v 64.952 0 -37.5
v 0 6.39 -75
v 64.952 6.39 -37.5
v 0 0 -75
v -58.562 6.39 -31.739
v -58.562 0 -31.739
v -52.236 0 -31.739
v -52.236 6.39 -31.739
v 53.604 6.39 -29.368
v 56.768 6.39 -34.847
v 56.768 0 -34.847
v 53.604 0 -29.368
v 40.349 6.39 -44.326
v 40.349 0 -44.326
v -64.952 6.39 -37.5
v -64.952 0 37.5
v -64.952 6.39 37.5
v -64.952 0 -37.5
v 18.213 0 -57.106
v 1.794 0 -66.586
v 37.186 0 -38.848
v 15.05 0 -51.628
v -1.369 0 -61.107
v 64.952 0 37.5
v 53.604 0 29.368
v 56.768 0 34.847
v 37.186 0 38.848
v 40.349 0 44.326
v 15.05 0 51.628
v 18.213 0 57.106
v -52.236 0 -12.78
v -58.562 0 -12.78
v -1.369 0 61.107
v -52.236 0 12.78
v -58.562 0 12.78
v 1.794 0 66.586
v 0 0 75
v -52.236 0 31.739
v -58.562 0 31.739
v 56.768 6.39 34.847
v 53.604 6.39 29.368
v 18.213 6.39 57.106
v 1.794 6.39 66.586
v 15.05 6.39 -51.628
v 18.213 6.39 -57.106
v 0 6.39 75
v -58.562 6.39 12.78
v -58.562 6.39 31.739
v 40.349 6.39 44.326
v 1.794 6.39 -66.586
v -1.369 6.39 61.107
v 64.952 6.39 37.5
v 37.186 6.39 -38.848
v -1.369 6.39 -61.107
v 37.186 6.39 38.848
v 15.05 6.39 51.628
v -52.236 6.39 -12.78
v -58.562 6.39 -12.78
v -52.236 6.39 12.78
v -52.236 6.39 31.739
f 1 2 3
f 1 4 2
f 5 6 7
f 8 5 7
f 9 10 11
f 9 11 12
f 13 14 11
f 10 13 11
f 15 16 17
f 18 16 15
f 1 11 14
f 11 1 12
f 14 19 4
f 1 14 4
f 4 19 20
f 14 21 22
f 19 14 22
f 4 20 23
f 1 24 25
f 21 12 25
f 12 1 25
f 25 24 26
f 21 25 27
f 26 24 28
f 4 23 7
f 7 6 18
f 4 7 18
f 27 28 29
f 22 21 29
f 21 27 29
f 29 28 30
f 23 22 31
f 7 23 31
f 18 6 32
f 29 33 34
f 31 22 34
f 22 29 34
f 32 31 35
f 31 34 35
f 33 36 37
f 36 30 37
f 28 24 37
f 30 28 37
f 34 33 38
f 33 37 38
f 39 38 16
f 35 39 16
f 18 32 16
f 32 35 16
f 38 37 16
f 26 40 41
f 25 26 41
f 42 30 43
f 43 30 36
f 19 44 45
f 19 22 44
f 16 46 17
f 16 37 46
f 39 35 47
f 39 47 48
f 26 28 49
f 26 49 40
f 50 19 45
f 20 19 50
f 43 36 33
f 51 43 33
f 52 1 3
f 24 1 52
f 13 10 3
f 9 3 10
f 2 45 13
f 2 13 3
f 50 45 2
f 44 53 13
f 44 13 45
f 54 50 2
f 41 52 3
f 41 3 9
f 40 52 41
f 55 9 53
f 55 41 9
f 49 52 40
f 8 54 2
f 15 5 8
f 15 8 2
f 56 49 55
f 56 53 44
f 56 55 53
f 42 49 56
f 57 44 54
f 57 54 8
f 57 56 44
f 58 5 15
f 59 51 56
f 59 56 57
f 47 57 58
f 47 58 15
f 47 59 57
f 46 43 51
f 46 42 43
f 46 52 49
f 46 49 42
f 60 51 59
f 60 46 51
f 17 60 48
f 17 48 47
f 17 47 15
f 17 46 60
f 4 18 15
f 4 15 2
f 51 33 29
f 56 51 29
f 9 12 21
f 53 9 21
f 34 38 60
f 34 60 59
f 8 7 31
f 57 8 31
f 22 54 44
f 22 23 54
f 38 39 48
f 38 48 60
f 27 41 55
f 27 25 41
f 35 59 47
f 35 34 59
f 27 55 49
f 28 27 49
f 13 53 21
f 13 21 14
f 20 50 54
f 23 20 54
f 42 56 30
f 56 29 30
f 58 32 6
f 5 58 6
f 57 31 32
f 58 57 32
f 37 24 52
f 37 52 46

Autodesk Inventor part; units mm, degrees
ref_plane "YZ Plane" through (0, 0, 0) normal (1, 0, 0) x (0, 1, 0)
ref_plane "XZ Plane" through (0, 0, 0) normal (0, 1, 0) x (-1, 0, 0)
ref_plane "XY Plane" through (0, 0, 0) normal (0, 0, 1) x (1, 0, 0)
sketch "Sketch1" plane through (0, 0, 0) normal (0, 1, 0) x (-1, 0, 0)
  circle A0 centre (0, 0) radius 30 construction
  line L0 (64.9519, -37.5) -> (0, -75)
  line L1 (0, -75) -> (-64.9519, -37.5)
  line L2 (-64.9519, -37.5) -> (-64.9519, 37.5)
  line L3 (-64.9519, 37.5) -> (0, 75)
  line L4 (0, 75) -> (64.9519, 37.5)
  line L5 (64.9519, 37.5) -> (64.9519, -37.5)
  line L6 (58.5619, 31.7388) -> (52.2358, 31.7388)
  line L7 (52.2358, 31.7388) -> (52.2358, 12.78)
  line L8 (52.2358, 12.78) -> (58.5619, 12.78)
  line L9 (58.5619, 12.78) -> (58.5619, 31.7388)
  line L10 (64.9519, 0) -> (0, 0) construction
  line L11 (58.5619, -31.7388) -> (52.2358, -31.7388)
  line L12 (52.2358, -31.7388) -> (52.2358, -12.78)
  line L13 (52.2358, -12.78) -> (58.5619, -12.78)
  line L14 (58.5619, -12.78) -> (58.5619, -31.7388)
  line L15 (-40.3488, 44.3261) -> (-56.7676, 34.8467)
  line L16 (-56.7676, 34.8467) -> (-53.6045, 29.3681)
  line L17 (-53.6045, 29.3681) -> (-37.1857, 38.8475)
  line L18 (-37.1857, 38.8475) -> (-40.3488, 44.3261)
  line L19 (-15.0501, 51.6275) -> (-18.2131, 57.1061)
  line L20 (-18.2131, 57.1061) -> (-1.7943, 66.5855)
  line L21 (-1.7943, 66.5855) -> (1.3687, 61.1069)
  line L22 (1.3687, 61.1069) -> (-15.0501, 51.6275)
  line L23 (-18.2131, -57.1061) -> (-1.7943, -66.5855)
  line L24 (-1.7943, -66.5855) -> (1.3687, -61.1069)
  line L25 (1.3687, -61.1069) -> (-15.0501, -51.6275)
  line L26 (-15.0501, -51.6275) -> (-18.2131, -57.1061)
  line L27 (-37.1857, -38.8475) -> (-40.3488, -44.3261)
  line L28 (-40.3488, -44.3261) -> (-56.7676, -34.8467)
  line L29 (-56.7676, -34.8467) -> (-53.6045, -29.3681)
  line L30 (-53.6045, -29.3681) -> (-37.1857, -38.8475)
  dimension "d0" = 60
  dimension "d2" = 150
  dimension "d3" = 6.3261
  dimension "d4" = 18.9588
  dimension "d5" = 6.39
  dimension "d6" = 12.78
  dimension "d9" = 360
extrude "Extrusion1" add sketch "Sketch1" along normal blind 6.39
equation "\"d3\" = 0.99 * WoodThickness"
equation "\"d4\" = 0.25 * DiskGap"
equation "\"d5\" = WoodThickness"
equation "\"d6\" = 2 * WoodThickness"
equation "\"d11\" = WoodThickness"
equation "\"WoodThickness\" = 6.39"
equation "\"DiskGap\" = 75.835317"
properties part number "LightDiskTop" material "MDF Medium Density Fiberboard"
